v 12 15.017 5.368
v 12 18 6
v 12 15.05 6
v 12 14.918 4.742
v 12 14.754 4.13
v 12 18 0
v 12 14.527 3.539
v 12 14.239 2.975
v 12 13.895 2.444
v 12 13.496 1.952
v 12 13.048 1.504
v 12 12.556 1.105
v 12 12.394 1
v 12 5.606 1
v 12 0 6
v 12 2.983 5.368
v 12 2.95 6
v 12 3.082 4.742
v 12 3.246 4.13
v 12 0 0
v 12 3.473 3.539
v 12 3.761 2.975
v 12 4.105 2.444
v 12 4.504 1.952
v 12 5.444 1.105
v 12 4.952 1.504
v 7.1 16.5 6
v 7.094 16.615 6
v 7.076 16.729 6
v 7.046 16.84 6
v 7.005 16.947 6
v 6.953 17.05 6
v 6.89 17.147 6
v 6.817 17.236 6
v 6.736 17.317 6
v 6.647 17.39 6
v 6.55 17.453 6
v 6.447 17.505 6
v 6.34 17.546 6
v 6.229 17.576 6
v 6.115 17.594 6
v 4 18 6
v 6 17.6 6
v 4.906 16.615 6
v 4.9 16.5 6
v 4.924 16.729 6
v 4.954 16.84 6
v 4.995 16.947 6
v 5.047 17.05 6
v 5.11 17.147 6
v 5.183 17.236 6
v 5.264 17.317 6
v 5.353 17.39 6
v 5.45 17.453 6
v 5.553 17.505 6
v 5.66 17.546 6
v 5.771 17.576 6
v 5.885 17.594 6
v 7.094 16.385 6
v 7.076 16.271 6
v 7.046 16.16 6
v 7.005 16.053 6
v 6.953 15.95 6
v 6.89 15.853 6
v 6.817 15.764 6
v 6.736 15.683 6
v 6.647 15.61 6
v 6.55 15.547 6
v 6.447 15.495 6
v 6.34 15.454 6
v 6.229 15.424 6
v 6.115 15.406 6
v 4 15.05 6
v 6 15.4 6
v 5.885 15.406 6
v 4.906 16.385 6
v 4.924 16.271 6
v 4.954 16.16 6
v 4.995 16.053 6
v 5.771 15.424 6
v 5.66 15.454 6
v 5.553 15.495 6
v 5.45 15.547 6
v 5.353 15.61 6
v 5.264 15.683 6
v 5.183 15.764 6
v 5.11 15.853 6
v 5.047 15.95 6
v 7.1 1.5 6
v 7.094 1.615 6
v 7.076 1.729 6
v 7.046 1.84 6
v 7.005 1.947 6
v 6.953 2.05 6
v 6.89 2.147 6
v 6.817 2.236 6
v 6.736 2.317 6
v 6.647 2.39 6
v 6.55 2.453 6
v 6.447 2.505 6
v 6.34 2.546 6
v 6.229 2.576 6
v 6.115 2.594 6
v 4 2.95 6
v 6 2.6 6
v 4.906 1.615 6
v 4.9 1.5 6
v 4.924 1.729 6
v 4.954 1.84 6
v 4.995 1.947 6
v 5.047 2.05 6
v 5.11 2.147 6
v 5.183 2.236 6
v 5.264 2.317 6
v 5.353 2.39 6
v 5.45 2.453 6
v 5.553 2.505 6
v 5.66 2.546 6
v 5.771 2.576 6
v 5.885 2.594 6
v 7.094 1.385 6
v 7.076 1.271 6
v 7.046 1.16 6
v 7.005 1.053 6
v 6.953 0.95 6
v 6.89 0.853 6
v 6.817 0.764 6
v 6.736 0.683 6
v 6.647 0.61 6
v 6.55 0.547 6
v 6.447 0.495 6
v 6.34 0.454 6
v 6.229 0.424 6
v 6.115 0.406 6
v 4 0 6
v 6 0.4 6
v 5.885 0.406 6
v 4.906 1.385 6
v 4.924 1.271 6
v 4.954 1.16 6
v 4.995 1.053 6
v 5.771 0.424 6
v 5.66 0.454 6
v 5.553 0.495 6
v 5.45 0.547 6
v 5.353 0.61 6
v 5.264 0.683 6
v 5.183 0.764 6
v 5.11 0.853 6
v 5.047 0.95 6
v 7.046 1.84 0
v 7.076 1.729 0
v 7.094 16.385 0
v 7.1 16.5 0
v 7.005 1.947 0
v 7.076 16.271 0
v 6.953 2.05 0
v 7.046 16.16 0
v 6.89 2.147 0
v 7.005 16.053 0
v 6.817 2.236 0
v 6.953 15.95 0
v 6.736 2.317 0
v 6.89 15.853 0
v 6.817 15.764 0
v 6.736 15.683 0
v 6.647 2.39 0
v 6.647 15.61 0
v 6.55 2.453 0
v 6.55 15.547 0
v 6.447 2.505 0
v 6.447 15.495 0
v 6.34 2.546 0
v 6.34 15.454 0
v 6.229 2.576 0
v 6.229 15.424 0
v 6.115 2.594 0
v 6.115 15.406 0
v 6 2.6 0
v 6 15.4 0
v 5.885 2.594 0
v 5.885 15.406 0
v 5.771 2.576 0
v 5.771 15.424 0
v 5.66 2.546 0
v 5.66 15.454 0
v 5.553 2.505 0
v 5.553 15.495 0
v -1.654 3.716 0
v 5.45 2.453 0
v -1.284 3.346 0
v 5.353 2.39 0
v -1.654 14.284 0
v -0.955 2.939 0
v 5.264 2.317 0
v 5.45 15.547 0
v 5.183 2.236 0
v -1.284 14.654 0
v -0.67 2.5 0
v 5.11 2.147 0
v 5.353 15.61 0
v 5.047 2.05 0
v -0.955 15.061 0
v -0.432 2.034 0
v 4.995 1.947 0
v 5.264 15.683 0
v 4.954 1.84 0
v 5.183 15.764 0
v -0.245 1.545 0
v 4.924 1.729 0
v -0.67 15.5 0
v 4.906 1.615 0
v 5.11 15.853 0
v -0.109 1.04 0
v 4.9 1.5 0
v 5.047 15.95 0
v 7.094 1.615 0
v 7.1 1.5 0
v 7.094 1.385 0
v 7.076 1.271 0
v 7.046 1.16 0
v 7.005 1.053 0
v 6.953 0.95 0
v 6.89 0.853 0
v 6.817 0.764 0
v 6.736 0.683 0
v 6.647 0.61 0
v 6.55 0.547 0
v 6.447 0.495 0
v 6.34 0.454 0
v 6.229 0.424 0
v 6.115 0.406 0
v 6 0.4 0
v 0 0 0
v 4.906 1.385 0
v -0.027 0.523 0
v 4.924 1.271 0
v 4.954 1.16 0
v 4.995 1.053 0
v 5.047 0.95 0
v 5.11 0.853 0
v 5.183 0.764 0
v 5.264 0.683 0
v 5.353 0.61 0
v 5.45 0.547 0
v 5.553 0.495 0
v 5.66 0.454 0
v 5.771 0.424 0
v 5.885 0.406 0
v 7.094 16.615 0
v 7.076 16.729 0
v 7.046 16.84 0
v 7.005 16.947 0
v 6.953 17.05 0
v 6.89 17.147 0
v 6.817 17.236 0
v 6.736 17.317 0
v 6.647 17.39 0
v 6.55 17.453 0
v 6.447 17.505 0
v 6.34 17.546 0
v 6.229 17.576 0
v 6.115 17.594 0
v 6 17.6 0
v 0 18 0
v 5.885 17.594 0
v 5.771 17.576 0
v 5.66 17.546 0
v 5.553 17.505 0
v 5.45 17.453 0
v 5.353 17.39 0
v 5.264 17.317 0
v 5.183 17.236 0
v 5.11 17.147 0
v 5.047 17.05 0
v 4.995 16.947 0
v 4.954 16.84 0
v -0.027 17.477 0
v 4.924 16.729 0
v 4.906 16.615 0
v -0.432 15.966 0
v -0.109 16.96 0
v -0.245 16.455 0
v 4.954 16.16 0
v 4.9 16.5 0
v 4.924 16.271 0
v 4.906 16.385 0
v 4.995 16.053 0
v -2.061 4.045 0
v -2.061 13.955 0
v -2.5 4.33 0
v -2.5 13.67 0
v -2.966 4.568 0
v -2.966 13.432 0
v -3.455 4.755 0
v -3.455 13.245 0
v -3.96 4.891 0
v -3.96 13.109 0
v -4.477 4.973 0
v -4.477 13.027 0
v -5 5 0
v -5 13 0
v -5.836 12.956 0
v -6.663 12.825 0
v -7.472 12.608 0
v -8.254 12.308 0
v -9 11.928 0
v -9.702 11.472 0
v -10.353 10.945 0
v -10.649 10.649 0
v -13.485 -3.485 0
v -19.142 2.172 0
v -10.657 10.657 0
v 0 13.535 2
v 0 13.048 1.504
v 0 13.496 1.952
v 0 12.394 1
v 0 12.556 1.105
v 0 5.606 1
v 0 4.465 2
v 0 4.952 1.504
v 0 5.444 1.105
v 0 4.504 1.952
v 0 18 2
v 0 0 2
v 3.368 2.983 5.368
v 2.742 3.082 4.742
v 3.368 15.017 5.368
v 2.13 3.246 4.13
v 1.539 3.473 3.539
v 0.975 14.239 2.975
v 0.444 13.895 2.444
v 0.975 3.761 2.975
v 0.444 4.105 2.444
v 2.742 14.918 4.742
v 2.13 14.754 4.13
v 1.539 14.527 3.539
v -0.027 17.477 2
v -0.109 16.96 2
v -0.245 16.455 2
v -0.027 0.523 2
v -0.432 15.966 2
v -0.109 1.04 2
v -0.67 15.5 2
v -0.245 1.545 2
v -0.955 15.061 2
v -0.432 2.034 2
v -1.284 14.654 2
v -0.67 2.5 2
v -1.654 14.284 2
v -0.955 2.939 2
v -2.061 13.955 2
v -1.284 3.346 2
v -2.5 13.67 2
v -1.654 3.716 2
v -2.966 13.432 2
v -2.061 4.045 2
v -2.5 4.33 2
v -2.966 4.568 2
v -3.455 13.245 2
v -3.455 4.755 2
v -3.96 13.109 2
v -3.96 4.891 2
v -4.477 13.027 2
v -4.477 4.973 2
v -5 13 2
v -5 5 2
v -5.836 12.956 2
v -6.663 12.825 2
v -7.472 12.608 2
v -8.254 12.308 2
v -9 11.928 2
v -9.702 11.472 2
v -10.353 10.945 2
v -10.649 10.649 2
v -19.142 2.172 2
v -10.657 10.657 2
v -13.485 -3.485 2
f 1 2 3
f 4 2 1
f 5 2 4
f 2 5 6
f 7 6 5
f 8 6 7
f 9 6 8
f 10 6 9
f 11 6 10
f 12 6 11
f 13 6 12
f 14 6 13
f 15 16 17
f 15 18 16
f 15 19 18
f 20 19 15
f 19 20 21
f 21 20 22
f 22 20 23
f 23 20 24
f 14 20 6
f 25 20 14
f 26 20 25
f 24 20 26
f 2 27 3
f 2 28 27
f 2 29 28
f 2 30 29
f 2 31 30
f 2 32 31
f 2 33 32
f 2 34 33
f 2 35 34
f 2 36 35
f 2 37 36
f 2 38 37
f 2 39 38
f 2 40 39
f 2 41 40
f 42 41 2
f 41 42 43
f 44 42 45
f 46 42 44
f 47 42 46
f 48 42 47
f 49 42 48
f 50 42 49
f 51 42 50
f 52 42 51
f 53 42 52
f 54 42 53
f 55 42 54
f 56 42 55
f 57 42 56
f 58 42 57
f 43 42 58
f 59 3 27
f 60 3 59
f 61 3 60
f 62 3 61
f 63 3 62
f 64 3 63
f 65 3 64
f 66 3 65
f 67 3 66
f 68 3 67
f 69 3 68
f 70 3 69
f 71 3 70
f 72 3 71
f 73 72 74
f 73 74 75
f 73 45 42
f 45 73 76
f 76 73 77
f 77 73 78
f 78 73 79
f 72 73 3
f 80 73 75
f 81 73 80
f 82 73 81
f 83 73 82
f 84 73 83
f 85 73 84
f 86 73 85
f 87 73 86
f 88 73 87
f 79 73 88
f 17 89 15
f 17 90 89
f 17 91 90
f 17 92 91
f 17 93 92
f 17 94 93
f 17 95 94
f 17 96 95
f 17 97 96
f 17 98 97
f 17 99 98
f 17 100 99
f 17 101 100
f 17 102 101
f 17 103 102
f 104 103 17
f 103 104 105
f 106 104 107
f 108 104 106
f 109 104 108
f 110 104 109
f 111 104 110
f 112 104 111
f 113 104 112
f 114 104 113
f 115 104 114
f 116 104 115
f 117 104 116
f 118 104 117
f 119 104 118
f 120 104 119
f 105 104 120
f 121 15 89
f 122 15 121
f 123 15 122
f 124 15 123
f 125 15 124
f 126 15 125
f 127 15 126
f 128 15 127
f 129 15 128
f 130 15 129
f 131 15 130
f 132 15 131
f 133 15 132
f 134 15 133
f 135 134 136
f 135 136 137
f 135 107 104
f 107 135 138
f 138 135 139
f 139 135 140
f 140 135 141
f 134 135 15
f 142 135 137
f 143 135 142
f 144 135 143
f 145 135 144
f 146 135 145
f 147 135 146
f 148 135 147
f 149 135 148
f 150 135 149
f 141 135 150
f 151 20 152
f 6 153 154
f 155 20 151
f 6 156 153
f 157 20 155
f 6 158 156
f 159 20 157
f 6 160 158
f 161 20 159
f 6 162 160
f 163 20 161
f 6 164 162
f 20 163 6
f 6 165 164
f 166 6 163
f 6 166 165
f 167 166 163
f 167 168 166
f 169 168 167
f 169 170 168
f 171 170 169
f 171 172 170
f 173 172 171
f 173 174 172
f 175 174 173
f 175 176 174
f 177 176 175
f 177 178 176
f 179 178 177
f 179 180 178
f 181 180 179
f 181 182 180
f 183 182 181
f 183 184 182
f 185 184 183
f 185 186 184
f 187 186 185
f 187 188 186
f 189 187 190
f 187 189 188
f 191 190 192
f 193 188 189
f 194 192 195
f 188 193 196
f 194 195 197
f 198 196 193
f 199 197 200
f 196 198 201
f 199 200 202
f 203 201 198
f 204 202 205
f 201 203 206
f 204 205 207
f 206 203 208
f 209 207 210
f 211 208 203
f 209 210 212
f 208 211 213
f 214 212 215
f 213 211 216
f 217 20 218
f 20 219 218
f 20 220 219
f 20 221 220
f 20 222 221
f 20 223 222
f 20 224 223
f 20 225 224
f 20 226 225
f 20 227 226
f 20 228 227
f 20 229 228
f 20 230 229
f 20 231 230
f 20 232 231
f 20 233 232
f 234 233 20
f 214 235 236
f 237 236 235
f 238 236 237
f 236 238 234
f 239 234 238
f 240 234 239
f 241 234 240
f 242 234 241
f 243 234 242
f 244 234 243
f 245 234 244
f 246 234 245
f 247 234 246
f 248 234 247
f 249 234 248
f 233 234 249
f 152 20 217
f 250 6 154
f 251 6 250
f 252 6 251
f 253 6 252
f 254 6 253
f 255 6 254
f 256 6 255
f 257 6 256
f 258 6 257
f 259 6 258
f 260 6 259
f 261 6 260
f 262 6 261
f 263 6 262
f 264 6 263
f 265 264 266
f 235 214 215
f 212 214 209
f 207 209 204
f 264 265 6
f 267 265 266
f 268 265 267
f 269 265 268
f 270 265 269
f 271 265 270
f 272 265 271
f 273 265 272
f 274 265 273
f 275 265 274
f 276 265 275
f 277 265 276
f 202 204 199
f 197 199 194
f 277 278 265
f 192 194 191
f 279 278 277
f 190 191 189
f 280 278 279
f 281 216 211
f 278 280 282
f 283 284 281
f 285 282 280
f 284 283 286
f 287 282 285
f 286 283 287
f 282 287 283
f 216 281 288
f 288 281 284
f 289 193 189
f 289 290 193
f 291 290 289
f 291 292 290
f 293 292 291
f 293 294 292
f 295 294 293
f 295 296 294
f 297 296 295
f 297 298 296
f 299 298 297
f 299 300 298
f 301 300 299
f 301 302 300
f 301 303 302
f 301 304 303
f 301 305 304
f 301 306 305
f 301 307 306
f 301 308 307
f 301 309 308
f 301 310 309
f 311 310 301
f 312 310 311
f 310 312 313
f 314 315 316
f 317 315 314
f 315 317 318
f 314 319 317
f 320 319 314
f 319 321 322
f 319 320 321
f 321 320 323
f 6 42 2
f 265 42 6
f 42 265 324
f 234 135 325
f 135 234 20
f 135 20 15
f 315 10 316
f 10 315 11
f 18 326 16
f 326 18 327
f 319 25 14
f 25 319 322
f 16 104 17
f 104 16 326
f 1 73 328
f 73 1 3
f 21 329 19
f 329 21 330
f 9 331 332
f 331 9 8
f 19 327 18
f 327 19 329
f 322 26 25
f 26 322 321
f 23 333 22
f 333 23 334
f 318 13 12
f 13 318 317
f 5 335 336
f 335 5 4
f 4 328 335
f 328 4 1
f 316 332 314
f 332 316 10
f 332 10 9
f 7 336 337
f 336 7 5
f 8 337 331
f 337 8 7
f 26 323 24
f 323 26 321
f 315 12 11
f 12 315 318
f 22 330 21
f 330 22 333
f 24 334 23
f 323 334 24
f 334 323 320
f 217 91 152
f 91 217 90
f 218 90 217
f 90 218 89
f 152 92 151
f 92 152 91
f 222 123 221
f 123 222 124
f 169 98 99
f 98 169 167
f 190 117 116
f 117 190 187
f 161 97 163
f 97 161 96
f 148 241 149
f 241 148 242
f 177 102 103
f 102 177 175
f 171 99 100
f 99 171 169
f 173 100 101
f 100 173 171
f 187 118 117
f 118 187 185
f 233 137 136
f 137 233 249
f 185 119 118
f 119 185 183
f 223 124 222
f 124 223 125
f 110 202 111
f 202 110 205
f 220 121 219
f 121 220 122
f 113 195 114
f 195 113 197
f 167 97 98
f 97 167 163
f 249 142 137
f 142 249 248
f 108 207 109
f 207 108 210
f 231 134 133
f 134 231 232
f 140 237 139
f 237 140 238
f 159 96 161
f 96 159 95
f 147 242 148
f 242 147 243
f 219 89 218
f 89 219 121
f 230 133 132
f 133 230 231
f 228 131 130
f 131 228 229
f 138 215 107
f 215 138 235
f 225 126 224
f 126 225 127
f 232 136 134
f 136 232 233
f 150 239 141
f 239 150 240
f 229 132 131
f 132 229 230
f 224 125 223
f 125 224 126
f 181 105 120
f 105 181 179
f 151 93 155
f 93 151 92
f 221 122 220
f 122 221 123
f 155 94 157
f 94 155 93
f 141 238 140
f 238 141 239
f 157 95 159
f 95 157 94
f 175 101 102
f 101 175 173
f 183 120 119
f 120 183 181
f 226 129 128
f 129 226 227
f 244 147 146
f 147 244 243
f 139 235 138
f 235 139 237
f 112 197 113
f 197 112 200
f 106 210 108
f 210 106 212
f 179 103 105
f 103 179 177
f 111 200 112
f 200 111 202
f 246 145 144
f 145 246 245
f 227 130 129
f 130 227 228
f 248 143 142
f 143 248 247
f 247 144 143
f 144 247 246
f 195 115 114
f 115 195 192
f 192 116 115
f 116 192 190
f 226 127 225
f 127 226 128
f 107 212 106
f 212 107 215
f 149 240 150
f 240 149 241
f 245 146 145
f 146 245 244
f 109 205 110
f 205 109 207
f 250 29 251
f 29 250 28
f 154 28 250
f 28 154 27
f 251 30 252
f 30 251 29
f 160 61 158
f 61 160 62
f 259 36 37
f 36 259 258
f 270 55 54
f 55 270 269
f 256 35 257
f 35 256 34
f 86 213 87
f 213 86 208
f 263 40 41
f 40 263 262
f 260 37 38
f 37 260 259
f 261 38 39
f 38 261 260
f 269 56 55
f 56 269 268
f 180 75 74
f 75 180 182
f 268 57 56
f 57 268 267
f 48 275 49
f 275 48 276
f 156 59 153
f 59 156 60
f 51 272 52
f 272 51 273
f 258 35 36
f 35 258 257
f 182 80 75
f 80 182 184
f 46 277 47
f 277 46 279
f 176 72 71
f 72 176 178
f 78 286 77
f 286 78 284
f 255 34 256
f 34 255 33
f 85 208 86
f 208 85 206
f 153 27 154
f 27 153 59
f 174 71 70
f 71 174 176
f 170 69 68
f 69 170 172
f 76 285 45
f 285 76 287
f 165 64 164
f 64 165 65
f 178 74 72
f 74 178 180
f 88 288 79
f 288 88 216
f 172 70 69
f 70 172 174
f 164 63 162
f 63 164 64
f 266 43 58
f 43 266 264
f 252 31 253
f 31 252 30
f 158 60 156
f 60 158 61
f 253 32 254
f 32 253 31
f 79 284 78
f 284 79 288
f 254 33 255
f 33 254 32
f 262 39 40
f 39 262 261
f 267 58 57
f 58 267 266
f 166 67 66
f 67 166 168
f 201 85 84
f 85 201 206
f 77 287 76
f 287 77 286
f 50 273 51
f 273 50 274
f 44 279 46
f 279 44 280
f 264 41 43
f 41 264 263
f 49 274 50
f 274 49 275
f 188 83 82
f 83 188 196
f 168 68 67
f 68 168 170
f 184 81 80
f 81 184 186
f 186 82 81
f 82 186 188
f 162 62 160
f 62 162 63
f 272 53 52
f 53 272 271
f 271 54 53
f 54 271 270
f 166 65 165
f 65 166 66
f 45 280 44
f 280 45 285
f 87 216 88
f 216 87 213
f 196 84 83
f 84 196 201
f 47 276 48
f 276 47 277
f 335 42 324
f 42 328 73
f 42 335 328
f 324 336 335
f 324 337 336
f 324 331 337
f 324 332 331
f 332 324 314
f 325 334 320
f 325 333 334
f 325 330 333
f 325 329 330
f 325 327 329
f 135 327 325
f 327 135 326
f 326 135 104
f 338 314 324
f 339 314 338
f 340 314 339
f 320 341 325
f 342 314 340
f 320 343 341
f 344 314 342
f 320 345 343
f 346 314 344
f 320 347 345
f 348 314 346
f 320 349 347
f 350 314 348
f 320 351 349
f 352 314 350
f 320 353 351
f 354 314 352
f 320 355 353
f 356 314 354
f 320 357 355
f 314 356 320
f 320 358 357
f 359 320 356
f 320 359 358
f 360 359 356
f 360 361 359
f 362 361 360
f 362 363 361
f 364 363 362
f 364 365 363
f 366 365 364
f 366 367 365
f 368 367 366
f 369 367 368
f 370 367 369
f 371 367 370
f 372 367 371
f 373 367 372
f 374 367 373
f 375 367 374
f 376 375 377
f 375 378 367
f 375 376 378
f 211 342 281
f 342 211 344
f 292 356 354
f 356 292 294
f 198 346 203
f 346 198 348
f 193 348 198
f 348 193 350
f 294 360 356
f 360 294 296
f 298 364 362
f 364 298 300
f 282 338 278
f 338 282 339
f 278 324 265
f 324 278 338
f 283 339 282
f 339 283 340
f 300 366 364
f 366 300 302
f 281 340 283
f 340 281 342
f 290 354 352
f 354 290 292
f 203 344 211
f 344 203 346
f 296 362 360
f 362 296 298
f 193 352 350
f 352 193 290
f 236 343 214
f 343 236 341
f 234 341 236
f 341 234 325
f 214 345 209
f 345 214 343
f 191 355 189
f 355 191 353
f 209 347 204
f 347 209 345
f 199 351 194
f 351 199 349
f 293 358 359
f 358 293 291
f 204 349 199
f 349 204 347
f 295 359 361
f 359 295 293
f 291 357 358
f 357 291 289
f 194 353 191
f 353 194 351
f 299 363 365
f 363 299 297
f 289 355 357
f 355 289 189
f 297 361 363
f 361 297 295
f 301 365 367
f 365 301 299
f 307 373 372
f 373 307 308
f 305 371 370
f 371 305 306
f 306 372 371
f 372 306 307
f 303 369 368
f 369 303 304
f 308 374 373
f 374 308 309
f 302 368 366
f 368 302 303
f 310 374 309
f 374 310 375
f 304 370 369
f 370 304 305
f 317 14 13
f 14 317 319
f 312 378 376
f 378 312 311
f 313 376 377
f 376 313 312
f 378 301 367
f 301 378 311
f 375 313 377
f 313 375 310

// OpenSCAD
$fn=60;
difference(){
cube([12,18,6]);
translate([-1,9,6])rotate([0,90,0])cylinder(d=12.1,h=14);
translate([6,1.5,-1])cylinder(d=2.2,h=14);
translate([6,16.5,-1])cylinder(d=2.2,h=14);
translate([0,-1,2])rotate([0,-45,0])cube([10,20,10]);
}
translate([0,3,0])cube([12,12,1]);
difference(){
translate([-5,0,0])cube([5,18,2]);
translate([-5,18,-1])cylinder(d=10,h=4);
translate([-5,0,-1])cylinder(d=10,h=4);
}
translate([-5,5,0])
rotate([0,0,45])translate([-12,0,0])cube([12,8,2]);
difference(){
translate([-5,5,0])cylinder(r=8,h=2);
translate([-15,-5,-1])cube([20,10,4]);
translate([-5,-5,-1])cube([10,20,4]);
}
